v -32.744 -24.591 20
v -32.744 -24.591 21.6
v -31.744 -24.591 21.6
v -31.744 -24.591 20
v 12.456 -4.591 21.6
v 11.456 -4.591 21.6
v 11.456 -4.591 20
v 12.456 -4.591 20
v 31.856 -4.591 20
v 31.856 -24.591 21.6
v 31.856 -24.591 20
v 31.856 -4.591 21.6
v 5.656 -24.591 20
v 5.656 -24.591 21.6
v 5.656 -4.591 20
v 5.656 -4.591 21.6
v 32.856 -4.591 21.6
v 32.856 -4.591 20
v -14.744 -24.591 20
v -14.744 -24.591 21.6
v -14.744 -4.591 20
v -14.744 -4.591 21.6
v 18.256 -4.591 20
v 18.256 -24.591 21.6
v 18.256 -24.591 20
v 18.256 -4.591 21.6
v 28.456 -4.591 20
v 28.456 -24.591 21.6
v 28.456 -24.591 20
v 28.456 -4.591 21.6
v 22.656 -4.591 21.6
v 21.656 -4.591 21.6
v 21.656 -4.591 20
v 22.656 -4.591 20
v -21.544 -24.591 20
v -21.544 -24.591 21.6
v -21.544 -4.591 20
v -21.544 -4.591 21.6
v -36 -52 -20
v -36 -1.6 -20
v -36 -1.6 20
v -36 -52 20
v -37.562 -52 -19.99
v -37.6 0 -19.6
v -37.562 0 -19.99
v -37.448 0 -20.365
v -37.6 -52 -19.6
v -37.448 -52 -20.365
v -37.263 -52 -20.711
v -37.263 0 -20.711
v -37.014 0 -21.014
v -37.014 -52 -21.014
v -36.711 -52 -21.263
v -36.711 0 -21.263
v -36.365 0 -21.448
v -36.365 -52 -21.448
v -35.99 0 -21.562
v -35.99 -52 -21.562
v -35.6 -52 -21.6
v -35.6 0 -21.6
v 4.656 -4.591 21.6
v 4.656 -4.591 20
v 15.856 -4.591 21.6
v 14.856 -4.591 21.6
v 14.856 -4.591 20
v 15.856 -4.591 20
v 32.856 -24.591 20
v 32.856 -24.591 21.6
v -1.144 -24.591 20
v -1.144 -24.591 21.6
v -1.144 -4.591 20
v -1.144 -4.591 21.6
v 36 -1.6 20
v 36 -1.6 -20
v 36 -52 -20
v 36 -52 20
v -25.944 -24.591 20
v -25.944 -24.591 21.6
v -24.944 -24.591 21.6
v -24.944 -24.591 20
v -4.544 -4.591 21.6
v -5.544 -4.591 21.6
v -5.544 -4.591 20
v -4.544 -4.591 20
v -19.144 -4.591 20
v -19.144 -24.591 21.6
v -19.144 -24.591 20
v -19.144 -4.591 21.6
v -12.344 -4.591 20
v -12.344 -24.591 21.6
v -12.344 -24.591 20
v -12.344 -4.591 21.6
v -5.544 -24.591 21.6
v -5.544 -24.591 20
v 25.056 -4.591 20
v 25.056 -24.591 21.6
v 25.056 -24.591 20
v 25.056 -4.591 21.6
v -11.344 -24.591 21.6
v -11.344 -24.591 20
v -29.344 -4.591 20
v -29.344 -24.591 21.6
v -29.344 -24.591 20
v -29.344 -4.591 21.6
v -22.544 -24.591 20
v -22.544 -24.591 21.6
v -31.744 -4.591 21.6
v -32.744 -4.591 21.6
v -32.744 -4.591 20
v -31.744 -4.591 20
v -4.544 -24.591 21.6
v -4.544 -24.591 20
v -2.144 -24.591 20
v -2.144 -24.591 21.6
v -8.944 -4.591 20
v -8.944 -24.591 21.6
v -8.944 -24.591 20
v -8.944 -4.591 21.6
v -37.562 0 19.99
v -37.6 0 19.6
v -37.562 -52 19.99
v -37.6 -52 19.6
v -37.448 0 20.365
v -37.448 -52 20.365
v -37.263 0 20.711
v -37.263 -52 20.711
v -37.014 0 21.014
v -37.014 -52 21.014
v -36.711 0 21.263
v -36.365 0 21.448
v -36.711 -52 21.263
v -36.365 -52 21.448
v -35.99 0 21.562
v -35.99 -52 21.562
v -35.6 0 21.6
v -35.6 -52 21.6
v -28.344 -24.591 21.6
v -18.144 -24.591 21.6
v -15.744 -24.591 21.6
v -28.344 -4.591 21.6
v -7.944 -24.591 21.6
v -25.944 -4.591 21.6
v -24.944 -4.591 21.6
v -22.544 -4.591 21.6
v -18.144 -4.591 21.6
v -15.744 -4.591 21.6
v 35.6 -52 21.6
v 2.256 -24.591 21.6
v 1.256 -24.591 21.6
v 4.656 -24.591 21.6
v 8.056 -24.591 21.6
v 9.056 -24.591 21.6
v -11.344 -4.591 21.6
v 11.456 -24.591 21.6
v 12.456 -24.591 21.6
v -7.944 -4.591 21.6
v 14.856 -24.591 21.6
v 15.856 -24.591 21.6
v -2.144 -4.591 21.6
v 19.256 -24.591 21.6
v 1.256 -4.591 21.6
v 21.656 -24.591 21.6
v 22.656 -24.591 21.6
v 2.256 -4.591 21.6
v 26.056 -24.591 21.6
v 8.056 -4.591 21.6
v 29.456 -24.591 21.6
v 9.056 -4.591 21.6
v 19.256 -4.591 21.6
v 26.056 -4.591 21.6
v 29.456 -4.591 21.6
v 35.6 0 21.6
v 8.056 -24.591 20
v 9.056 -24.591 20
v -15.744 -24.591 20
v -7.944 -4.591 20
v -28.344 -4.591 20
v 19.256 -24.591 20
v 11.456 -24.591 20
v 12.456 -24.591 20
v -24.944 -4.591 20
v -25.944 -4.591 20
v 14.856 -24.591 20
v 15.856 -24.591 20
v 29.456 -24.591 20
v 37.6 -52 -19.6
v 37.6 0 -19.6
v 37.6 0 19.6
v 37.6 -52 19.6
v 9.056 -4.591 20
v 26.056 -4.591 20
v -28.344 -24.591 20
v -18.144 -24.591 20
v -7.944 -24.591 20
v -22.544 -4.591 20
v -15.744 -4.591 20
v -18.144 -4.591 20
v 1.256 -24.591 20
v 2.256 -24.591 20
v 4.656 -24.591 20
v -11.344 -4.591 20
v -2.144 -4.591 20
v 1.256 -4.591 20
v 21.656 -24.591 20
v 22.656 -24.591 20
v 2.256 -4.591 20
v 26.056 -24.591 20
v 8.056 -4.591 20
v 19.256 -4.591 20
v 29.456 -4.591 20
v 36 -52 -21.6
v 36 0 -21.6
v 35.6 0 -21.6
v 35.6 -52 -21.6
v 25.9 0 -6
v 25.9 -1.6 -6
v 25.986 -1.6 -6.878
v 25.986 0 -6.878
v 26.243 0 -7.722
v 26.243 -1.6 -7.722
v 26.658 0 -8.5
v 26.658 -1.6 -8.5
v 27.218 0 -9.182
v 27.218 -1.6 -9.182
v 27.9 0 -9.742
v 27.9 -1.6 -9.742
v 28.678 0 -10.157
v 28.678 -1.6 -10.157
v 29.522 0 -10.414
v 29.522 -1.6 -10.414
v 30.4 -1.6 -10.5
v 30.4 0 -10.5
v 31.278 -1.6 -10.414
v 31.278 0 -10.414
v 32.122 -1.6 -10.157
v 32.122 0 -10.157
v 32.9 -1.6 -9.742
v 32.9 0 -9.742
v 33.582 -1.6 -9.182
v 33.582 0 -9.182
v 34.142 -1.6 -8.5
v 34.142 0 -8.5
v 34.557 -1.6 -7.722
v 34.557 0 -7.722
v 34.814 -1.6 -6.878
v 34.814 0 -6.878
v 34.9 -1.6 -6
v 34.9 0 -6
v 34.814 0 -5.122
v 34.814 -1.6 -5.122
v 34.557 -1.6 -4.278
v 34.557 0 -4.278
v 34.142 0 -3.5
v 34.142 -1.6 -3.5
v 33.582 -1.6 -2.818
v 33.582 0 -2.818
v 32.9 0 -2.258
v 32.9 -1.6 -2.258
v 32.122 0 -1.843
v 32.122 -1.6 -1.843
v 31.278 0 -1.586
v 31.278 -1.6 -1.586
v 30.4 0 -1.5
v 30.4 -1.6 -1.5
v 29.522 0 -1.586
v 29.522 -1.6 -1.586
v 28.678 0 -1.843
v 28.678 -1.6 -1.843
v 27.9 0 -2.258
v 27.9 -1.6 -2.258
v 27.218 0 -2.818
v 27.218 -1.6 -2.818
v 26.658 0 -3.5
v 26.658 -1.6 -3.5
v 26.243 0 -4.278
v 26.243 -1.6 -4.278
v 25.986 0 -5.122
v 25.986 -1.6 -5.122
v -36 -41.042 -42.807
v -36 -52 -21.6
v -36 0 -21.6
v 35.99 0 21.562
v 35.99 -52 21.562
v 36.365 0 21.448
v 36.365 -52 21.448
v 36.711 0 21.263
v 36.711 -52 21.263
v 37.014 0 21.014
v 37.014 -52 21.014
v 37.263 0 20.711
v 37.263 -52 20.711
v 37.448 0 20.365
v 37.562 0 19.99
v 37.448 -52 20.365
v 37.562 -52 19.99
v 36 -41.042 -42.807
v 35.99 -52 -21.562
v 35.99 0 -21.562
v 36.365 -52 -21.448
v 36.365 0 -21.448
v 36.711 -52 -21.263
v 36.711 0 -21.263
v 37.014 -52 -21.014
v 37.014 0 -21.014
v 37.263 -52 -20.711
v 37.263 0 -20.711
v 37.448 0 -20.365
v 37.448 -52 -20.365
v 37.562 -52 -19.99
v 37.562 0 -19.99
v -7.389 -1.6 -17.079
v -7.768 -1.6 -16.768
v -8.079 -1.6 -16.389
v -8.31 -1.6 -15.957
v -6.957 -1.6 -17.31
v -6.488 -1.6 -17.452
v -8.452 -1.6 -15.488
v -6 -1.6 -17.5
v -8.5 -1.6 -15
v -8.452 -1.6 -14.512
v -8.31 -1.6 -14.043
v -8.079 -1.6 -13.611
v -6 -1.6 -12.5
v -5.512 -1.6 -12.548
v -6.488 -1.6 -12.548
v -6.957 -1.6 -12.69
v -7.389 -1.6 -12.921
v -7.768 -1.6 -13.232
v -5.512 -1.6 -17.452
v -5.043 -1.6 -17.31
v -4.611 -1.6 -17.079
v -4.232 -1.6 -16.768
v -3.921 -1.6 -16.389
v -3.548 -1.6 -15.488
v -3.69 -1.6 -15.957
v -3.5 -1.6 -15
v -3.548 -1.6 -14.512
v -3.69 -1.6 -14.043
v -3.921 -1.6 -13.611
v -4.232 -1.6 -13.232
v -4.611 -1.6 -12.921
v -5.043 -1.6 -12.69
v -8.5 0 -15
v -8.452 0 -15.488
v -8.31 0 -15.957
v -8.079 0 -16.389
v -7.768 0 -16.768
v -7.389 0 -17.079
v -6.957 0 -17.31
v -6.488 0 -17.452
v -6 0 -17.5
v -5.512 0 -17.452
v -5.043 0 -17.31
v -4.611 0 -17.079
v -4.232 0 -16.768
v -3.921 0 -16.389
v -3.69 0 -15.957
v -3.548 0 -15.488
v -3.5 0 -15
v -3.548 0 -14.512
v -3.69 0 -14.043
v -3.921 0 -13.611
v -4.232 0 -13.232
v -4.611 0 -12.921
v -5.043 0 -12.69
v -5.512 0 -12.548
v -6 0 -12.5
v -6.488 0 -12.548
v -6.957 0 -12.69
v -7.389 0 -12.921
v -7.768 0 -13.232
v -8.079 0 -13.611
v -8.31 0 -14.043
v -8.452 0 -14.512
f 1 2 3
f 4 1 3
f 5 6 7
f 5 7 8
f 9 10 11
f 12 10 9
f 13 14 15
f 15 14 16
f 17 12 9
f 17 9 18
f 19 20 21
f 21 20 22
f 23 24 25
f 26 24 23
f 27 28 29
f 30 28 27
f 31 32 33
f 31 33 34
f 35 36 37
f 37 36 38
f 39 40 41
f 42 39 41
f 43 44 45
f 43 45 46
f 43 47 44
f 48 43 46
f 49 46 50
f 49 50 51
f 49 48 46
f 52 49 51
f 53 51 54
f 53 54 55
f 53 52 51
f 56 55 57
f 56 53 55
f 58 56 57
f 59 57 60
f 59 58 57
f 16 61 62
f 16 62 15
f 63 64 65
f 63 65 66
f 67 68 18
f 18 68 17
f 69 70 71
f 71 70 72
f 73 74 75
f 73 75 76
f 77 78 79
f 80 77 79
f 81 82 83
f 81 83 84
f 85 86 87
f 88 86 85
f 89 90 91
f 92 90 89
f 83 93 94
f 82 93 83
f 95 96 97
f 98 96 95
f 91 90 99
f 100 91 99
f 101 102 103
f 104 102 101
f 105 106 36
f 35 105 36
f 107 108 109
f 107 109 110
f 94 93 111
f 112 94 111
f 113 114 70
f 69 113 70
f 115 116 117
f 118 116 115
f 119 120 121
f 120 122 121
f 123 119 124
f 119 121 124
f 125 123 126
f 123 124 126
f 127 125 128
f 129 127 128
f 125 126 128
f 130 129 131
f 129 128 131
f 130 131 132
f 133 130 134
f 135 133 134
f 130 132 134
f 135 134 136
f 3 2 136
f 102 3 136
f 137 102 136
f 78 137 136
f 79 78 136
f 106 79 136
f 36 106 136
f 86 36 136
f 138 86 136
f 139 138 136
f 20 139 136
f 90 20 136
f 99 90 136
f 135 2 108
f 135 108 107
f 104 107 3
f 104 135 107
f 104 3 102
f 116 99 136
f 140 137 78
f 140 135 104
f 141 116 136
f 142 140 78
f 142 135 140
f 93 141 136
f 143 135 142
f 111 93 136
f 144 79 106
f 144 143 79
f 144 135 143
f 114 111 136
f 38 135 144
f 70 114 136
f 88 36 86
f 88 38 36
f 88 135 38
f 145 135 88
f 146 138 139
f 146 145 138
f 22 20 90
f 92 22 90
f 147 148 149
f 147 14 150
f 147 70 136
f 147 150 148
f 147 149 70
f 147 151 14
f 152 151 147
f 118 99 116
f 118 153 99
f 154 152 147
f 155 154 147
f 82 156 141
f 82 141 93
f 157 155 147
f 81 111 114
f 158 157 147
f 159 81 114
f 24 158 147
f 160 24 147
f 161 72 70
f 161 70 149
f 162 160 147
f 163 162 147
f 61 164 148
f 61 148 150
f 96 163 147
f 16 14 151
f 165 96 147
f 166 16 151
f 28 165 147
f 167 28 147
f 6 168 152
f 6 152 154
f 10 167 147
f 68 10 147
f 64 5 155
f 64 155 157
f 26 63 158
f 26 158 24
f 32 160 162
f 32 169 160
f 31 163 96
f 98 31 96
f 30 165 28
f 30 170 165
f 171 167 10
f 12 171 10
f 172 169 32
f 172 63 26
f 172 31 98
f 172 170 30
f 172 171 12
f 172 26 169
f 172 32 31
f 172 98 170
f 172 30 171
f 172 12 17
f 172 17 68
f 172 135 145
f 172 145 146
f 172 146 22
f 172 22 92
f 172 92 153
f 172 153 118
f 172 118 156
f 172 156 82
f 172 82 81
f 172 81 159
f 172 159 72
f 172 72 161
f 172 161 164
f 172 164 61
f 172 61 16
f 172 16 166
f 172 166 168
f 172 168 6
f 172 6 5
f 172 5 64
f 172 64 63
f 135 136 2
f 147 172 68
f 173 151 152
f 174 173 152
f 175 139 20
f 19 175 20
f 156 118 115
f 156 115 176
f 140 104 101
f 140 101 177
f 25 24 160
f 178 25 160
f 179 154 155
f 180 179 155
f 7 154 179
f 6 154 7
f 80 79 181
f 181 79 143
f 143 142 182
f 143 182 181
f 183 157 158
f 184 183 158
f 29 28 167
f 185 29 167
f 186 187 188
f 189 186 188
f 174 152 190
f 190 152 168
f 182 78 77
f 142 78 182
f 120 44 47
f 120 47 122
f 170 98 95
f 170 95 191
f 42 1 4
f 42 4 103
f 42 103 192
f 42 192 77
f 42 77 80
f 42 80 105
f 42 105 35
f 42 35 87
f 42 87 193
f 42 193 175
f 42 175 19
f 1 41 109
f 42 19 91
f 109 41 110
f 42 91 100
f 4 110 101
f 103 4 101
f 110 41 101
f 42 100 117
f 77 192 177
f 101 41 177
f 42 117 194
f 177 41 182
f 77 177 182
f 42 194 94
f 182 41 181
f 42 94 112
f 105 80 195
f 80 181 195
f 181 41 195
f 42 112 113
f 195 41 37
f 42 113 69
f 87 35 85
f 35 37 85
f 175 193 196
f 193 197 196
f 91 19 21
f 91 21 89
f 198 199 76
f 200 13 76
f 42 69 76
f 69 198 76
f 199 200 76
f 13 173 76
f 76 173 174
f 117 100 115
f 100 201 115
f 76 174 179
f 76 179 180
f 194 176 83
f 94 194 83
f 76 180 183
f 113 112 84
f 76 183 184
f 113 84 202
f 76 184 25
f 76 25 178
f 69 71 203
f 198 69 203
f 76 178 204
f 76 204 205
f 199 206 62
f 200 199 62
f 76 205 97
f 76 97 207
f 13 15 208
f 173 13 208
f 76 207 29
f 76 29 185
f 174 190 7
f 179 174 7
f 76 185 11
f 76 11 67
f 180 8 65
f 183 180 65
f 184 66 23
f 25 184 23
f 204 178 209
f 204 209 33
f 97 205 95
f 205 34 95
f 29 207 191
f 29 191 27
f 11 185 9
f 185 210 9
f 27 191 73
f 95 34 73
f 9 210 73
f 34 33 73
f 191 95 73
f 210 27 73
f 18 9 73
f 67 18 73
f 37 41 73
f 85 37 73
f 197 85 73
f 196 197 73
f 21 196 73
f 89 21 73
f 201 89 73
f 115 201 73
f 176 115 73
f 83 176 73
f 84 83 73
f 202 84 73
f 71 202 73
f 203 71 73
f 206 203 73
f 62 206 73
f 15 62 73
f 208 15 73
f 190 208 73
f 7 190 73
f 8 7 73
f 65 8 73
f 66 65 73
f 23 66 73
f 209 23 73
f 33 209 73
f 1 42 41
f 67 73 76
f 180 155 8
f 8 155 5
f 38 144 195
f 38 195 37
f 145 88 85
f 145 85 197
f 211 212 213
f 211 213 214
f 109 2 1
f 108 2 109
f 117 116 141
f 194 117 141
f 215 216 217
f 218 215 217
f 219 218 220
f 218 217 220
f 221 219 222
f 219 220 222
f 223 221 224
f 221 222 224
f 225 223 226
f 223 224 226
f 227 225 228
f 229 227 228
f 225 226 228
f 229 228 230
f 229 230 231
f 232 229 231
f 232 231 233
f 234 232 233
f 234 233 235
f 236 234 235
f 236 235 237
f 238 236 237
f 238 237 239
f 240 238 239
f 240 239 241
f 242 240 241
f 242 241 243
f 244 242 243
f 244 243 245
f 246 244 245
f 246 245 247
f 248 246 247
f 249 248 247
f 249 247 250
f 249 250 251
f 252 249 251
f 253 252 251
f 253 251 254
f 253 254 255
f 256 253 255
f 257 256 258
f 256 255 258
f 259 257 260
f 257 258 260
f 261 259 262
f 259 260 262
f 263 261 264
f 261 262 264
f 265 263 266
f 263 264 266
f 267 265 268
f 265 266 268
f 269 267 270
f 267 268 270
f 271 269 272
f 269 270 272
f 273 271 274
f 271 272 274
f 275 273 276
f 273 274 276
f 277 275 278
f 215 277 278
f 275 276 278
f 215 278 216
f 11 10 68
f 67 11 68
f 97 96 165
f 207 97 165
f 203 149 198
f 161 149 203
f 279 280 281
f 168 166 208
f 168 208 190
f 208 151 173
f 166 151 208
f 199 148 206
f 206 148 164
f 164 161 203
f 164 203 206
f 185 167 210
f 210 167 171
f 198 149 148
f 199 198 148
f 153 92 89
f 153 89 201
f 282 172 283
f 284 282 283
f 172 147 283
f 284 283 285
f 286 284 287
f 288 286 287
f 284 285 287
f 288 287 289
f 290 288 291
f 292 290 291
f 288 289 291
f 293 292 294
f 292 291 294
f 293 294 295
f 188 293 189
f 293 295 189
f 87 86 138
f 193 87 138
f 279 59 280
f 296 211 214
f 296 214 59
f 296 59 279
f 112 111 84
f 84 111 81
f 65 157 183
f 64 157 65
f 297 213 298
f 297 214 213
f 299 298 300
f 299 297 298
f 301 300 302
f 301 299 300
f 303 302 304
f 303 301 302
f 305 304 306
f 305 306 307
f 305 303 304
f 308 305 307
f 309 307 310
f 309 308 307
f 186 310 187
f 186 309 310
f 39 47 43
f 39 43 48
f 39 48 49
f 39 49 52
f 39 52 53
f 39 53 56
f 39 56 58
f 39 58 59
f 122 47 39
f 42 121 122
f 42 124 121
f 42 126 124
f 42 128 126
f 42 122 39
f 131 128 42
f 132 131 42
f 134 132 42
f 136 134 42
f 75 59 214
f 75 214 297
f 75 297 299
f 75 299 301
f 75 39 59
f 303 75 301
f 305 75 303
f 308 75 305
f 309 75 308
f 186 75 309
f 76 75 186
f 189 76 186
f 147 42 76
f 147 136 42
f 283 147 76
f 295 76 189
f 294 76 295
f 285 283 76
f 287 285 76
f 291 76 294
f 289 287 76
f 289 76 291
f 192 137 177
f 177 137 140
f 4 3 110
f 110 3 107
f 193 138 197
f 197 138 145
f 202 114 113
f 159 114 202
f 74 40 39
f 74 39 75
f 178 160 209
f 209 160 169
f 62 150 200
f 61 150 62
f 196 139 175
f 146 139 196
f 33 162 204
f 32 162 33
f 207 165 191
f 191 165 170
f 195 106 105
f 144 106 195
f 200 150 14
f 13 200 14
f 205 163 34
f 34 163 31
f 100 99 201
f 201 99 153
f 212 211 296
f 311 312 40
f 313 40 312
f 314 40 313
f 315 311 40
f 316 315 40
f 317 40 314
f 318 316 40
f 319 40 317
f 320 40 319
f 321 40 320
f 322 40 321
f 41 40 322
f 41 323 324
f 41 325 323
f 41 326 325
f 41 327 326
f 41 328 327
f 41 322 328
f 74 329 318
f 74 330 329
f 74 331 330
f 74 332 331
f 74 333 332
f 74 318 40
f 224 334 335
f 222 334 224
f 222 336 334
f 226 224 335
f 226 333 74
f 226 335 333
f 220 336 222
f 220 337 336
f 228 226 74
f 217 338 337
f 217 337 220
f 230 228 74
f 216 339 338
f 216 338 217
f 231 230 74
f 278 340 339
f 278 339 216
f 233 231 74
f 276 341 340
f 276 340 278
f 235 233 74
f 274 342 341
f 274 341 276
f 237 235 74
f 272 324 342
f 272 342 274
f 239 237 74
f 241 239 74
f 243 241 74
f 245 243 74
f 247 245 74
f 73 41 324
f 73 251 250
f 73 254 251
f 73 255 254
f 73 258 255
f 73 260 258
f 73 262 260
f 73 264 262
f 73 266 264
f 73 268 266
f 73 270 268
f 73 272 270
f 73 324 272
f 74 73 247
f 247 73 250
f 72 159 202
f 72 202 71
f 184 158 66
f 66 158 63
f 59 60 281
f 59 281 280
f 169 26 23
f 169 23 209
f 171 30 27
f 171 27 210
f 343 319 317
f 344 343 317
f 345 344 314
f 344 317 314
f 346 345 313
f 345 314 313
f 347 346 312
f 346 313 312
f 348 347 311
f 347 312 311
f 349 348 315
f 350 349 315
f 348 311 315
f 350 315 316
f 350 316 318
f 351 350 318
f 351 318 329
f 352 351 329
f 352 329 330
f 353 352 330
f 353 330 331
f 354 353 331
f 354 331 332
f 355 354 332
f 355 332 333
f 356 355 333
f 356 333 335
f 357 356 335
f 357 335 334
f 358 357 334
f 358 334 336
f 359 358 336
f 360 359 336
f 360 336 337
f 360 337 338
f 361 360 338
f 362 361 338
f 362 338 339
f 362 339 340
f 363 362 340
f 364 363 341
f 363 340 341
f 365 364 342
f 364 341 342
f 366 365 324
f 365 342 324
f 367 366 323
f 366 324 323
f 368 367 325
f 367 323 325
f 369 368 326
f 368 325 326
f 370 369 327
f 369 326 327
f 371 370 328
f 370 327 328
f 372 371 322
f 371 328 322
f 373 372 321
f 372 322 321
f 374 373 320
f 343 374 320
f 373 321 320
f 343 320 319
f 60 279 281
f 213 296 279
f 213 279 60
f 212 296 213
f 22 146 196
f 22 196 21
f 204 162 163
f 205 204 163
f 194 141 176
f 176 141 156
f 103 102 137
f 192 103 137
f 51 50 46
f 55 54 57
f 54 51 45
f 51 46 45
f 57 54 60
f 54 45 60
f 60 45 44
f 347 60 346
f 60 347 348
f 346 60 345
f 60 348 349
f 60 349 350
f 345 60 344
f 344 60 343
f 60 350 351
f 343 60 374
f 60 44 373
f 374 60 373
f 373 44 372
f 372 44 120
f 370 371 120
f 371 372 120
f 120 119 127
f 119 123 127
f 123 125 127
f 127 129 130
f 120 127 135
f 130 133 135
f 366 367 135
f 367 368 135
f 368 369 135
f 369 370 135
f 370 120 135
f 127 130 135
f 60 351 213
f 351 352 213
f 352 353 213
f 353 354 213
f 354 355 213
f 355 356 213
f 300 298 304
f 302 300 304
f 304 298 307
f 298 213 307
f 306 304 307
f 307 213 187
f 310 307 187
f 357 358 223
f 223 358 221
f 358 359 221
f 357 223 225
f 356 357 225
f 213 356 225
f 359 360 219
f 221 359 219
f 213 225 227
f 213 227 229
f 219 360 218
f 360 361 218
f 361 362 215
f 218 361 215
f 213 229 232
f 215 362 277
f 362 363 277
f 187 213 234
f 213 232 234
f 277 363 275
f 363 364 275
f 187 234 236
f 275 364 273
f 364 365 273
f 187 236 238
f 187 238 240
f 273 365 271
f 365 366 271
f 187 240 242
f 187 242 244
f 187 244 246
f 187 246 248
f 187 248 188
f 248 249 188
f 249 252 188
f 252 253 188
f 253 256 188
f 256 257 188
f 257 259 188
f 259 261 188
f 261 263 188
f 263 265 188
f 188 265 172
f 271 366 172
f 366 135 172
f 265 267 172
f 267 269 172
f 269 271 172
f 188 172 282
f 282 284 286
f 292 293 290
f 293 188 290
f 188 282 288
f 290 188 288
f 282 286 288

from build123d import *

# Parameters (mm, degrees)
F0_W     = 75.2
F0_H     = 43.2
F0_W_2   = 72
F0_H_2   = 40
F1_DEPTH = 52
F2_R     = 2
F3_DEPTH = 1.6
F5_DEPTH = 36
F6_D     = 9
F7_D     = 5
F8_W     = 1
F8_H     = 20
F9_DEPTH = 25


with BuildPart() as f1:
    # F0 (on Front) → F1 (new body)
    with BuildSketch(Plane.XZ):
        Rectangle(F0_W, F0_H)
        Rectangle(F0_W_2, F0_H_2, mode=Mode.SUBTRACT)
    extrude(amount=F1_DEPTH)

    # F2
    f2_edges = [f1.edges().sort_by_distance(p)[0] for p in [
        (37.6, -26, 21.6),
        (-37.6, -26, 21.6),
        (-37.6, -26, -21.6),
        (37.6, -26, -21.6),
    ]]
    fillet(f2_edges, radius=F2_R)

    # F0 (on Front) → F3 (join)
    with BuildSketch(Plane.XZ):
        Rectangle(F0_W_2, F0_H_2)
    extrude(amount=F3_DEPTH)

    # F4 (on Right) → F5 (join, symmetric)
    with BuildSketch(Plane.YZ):
        Polygon((0, -21.6), (-52, -21.6), (-41.0421315348, -42.8069394041), align=None)
    extrude(amount=F5_DEPTH, both=True)

    # F6 (through all)
    with Locations(Plane(origin=(0, 0, 0), x_dir=(1, 0, 0), z_dir=(0, 1, 0))):
        with Locations((30.4, 6)):
            Hole(F6_D / 2)

    # F7 (through all)
    with Locations(Plane(origin=(0, 0, 0), x_dir=(1, 0, 0), z_dir=(0, 1, 0))):
        with Locations((-6, 15)):
            Hole(F7_D / 2)

    # F8 (on face) → F9 (cut)
    with BuildSketch(Plane.XY.offset(21.6)):
        with Locations((-32.2436588705, -14.5910207555)):
            Rectangle(F8_W, F8_H)
        with Locations((-28.8436588705, -14.5910207555)):
            Rectangle(F8_W, F8_H)
        with Locations((-25.4436588705, -14.5910207555)):
            Rectangle(F8_W, F8_H)
        with Locations((-22.0436588705, -14.5910207555)):
            Rectangle(F8_W, F8_H)
        with Locations((-18.6436588705, -14.5910207555)):
            Rectangle(F8_W, F8_H)
        with Locations((-15.2436588705, -14.5910207555)):
            Rectangle(F8_W, F8_H)
        with Locations((-11.8436588705, -14.5910207555)):
            Rectangle(F8_W, F8_H)
        with Locations((-8.4436588705, -14.5910207555)):
            Rectangle(F8_W, F8_H)
        with Locations((-5.0436588705, -14.5910207555)):
            Rectangle(F8_W, F8_H)
        with Locations((1.7563411295, -14.5910207555)):
            Rectangle(F8_W, F8_H)
        with Locations((5.1563411295, -14.5910207555)):
            Rectangle(F8_W, F8_H)
        with Locations((-1.6436588705, -14.5910207555)):
            Rectangle(F8_W, F8_H)
        with Locations((8.5563411295, -14.5910207555)):
            Rectangle(F8_W, F8_H)
        with Locations((11.9563411295, -14.5910207555)):
            Rectangle(F8_W, F8_H)
        with Locations((15.3563411295, -14.5910207555)):
            Rectangle(F8_W, F8_H)
        with Locations((18.7563411295, -14.5910207555)):
            Rectangle(F8_W, F8_H)
        with Locations((22.1563411295, -14.5910207555)):
            Rectangle(F8_W, F8_H)
        with Locations((25.5563411295, -14.5910207555)):
            Rectangle(F8_W, F8_H)
        with Locations((28.9563411295, -14.5910207555)):
            Rectangle(F8_W, F8_H)
        with Locations((32.3563411295, -14.5910207555)):
            Rectangle(F8_W, F8_H)
    extrude(amount=-F9_DEPTH, mode=Mode.SUBTRACT)


solid = f1.part
